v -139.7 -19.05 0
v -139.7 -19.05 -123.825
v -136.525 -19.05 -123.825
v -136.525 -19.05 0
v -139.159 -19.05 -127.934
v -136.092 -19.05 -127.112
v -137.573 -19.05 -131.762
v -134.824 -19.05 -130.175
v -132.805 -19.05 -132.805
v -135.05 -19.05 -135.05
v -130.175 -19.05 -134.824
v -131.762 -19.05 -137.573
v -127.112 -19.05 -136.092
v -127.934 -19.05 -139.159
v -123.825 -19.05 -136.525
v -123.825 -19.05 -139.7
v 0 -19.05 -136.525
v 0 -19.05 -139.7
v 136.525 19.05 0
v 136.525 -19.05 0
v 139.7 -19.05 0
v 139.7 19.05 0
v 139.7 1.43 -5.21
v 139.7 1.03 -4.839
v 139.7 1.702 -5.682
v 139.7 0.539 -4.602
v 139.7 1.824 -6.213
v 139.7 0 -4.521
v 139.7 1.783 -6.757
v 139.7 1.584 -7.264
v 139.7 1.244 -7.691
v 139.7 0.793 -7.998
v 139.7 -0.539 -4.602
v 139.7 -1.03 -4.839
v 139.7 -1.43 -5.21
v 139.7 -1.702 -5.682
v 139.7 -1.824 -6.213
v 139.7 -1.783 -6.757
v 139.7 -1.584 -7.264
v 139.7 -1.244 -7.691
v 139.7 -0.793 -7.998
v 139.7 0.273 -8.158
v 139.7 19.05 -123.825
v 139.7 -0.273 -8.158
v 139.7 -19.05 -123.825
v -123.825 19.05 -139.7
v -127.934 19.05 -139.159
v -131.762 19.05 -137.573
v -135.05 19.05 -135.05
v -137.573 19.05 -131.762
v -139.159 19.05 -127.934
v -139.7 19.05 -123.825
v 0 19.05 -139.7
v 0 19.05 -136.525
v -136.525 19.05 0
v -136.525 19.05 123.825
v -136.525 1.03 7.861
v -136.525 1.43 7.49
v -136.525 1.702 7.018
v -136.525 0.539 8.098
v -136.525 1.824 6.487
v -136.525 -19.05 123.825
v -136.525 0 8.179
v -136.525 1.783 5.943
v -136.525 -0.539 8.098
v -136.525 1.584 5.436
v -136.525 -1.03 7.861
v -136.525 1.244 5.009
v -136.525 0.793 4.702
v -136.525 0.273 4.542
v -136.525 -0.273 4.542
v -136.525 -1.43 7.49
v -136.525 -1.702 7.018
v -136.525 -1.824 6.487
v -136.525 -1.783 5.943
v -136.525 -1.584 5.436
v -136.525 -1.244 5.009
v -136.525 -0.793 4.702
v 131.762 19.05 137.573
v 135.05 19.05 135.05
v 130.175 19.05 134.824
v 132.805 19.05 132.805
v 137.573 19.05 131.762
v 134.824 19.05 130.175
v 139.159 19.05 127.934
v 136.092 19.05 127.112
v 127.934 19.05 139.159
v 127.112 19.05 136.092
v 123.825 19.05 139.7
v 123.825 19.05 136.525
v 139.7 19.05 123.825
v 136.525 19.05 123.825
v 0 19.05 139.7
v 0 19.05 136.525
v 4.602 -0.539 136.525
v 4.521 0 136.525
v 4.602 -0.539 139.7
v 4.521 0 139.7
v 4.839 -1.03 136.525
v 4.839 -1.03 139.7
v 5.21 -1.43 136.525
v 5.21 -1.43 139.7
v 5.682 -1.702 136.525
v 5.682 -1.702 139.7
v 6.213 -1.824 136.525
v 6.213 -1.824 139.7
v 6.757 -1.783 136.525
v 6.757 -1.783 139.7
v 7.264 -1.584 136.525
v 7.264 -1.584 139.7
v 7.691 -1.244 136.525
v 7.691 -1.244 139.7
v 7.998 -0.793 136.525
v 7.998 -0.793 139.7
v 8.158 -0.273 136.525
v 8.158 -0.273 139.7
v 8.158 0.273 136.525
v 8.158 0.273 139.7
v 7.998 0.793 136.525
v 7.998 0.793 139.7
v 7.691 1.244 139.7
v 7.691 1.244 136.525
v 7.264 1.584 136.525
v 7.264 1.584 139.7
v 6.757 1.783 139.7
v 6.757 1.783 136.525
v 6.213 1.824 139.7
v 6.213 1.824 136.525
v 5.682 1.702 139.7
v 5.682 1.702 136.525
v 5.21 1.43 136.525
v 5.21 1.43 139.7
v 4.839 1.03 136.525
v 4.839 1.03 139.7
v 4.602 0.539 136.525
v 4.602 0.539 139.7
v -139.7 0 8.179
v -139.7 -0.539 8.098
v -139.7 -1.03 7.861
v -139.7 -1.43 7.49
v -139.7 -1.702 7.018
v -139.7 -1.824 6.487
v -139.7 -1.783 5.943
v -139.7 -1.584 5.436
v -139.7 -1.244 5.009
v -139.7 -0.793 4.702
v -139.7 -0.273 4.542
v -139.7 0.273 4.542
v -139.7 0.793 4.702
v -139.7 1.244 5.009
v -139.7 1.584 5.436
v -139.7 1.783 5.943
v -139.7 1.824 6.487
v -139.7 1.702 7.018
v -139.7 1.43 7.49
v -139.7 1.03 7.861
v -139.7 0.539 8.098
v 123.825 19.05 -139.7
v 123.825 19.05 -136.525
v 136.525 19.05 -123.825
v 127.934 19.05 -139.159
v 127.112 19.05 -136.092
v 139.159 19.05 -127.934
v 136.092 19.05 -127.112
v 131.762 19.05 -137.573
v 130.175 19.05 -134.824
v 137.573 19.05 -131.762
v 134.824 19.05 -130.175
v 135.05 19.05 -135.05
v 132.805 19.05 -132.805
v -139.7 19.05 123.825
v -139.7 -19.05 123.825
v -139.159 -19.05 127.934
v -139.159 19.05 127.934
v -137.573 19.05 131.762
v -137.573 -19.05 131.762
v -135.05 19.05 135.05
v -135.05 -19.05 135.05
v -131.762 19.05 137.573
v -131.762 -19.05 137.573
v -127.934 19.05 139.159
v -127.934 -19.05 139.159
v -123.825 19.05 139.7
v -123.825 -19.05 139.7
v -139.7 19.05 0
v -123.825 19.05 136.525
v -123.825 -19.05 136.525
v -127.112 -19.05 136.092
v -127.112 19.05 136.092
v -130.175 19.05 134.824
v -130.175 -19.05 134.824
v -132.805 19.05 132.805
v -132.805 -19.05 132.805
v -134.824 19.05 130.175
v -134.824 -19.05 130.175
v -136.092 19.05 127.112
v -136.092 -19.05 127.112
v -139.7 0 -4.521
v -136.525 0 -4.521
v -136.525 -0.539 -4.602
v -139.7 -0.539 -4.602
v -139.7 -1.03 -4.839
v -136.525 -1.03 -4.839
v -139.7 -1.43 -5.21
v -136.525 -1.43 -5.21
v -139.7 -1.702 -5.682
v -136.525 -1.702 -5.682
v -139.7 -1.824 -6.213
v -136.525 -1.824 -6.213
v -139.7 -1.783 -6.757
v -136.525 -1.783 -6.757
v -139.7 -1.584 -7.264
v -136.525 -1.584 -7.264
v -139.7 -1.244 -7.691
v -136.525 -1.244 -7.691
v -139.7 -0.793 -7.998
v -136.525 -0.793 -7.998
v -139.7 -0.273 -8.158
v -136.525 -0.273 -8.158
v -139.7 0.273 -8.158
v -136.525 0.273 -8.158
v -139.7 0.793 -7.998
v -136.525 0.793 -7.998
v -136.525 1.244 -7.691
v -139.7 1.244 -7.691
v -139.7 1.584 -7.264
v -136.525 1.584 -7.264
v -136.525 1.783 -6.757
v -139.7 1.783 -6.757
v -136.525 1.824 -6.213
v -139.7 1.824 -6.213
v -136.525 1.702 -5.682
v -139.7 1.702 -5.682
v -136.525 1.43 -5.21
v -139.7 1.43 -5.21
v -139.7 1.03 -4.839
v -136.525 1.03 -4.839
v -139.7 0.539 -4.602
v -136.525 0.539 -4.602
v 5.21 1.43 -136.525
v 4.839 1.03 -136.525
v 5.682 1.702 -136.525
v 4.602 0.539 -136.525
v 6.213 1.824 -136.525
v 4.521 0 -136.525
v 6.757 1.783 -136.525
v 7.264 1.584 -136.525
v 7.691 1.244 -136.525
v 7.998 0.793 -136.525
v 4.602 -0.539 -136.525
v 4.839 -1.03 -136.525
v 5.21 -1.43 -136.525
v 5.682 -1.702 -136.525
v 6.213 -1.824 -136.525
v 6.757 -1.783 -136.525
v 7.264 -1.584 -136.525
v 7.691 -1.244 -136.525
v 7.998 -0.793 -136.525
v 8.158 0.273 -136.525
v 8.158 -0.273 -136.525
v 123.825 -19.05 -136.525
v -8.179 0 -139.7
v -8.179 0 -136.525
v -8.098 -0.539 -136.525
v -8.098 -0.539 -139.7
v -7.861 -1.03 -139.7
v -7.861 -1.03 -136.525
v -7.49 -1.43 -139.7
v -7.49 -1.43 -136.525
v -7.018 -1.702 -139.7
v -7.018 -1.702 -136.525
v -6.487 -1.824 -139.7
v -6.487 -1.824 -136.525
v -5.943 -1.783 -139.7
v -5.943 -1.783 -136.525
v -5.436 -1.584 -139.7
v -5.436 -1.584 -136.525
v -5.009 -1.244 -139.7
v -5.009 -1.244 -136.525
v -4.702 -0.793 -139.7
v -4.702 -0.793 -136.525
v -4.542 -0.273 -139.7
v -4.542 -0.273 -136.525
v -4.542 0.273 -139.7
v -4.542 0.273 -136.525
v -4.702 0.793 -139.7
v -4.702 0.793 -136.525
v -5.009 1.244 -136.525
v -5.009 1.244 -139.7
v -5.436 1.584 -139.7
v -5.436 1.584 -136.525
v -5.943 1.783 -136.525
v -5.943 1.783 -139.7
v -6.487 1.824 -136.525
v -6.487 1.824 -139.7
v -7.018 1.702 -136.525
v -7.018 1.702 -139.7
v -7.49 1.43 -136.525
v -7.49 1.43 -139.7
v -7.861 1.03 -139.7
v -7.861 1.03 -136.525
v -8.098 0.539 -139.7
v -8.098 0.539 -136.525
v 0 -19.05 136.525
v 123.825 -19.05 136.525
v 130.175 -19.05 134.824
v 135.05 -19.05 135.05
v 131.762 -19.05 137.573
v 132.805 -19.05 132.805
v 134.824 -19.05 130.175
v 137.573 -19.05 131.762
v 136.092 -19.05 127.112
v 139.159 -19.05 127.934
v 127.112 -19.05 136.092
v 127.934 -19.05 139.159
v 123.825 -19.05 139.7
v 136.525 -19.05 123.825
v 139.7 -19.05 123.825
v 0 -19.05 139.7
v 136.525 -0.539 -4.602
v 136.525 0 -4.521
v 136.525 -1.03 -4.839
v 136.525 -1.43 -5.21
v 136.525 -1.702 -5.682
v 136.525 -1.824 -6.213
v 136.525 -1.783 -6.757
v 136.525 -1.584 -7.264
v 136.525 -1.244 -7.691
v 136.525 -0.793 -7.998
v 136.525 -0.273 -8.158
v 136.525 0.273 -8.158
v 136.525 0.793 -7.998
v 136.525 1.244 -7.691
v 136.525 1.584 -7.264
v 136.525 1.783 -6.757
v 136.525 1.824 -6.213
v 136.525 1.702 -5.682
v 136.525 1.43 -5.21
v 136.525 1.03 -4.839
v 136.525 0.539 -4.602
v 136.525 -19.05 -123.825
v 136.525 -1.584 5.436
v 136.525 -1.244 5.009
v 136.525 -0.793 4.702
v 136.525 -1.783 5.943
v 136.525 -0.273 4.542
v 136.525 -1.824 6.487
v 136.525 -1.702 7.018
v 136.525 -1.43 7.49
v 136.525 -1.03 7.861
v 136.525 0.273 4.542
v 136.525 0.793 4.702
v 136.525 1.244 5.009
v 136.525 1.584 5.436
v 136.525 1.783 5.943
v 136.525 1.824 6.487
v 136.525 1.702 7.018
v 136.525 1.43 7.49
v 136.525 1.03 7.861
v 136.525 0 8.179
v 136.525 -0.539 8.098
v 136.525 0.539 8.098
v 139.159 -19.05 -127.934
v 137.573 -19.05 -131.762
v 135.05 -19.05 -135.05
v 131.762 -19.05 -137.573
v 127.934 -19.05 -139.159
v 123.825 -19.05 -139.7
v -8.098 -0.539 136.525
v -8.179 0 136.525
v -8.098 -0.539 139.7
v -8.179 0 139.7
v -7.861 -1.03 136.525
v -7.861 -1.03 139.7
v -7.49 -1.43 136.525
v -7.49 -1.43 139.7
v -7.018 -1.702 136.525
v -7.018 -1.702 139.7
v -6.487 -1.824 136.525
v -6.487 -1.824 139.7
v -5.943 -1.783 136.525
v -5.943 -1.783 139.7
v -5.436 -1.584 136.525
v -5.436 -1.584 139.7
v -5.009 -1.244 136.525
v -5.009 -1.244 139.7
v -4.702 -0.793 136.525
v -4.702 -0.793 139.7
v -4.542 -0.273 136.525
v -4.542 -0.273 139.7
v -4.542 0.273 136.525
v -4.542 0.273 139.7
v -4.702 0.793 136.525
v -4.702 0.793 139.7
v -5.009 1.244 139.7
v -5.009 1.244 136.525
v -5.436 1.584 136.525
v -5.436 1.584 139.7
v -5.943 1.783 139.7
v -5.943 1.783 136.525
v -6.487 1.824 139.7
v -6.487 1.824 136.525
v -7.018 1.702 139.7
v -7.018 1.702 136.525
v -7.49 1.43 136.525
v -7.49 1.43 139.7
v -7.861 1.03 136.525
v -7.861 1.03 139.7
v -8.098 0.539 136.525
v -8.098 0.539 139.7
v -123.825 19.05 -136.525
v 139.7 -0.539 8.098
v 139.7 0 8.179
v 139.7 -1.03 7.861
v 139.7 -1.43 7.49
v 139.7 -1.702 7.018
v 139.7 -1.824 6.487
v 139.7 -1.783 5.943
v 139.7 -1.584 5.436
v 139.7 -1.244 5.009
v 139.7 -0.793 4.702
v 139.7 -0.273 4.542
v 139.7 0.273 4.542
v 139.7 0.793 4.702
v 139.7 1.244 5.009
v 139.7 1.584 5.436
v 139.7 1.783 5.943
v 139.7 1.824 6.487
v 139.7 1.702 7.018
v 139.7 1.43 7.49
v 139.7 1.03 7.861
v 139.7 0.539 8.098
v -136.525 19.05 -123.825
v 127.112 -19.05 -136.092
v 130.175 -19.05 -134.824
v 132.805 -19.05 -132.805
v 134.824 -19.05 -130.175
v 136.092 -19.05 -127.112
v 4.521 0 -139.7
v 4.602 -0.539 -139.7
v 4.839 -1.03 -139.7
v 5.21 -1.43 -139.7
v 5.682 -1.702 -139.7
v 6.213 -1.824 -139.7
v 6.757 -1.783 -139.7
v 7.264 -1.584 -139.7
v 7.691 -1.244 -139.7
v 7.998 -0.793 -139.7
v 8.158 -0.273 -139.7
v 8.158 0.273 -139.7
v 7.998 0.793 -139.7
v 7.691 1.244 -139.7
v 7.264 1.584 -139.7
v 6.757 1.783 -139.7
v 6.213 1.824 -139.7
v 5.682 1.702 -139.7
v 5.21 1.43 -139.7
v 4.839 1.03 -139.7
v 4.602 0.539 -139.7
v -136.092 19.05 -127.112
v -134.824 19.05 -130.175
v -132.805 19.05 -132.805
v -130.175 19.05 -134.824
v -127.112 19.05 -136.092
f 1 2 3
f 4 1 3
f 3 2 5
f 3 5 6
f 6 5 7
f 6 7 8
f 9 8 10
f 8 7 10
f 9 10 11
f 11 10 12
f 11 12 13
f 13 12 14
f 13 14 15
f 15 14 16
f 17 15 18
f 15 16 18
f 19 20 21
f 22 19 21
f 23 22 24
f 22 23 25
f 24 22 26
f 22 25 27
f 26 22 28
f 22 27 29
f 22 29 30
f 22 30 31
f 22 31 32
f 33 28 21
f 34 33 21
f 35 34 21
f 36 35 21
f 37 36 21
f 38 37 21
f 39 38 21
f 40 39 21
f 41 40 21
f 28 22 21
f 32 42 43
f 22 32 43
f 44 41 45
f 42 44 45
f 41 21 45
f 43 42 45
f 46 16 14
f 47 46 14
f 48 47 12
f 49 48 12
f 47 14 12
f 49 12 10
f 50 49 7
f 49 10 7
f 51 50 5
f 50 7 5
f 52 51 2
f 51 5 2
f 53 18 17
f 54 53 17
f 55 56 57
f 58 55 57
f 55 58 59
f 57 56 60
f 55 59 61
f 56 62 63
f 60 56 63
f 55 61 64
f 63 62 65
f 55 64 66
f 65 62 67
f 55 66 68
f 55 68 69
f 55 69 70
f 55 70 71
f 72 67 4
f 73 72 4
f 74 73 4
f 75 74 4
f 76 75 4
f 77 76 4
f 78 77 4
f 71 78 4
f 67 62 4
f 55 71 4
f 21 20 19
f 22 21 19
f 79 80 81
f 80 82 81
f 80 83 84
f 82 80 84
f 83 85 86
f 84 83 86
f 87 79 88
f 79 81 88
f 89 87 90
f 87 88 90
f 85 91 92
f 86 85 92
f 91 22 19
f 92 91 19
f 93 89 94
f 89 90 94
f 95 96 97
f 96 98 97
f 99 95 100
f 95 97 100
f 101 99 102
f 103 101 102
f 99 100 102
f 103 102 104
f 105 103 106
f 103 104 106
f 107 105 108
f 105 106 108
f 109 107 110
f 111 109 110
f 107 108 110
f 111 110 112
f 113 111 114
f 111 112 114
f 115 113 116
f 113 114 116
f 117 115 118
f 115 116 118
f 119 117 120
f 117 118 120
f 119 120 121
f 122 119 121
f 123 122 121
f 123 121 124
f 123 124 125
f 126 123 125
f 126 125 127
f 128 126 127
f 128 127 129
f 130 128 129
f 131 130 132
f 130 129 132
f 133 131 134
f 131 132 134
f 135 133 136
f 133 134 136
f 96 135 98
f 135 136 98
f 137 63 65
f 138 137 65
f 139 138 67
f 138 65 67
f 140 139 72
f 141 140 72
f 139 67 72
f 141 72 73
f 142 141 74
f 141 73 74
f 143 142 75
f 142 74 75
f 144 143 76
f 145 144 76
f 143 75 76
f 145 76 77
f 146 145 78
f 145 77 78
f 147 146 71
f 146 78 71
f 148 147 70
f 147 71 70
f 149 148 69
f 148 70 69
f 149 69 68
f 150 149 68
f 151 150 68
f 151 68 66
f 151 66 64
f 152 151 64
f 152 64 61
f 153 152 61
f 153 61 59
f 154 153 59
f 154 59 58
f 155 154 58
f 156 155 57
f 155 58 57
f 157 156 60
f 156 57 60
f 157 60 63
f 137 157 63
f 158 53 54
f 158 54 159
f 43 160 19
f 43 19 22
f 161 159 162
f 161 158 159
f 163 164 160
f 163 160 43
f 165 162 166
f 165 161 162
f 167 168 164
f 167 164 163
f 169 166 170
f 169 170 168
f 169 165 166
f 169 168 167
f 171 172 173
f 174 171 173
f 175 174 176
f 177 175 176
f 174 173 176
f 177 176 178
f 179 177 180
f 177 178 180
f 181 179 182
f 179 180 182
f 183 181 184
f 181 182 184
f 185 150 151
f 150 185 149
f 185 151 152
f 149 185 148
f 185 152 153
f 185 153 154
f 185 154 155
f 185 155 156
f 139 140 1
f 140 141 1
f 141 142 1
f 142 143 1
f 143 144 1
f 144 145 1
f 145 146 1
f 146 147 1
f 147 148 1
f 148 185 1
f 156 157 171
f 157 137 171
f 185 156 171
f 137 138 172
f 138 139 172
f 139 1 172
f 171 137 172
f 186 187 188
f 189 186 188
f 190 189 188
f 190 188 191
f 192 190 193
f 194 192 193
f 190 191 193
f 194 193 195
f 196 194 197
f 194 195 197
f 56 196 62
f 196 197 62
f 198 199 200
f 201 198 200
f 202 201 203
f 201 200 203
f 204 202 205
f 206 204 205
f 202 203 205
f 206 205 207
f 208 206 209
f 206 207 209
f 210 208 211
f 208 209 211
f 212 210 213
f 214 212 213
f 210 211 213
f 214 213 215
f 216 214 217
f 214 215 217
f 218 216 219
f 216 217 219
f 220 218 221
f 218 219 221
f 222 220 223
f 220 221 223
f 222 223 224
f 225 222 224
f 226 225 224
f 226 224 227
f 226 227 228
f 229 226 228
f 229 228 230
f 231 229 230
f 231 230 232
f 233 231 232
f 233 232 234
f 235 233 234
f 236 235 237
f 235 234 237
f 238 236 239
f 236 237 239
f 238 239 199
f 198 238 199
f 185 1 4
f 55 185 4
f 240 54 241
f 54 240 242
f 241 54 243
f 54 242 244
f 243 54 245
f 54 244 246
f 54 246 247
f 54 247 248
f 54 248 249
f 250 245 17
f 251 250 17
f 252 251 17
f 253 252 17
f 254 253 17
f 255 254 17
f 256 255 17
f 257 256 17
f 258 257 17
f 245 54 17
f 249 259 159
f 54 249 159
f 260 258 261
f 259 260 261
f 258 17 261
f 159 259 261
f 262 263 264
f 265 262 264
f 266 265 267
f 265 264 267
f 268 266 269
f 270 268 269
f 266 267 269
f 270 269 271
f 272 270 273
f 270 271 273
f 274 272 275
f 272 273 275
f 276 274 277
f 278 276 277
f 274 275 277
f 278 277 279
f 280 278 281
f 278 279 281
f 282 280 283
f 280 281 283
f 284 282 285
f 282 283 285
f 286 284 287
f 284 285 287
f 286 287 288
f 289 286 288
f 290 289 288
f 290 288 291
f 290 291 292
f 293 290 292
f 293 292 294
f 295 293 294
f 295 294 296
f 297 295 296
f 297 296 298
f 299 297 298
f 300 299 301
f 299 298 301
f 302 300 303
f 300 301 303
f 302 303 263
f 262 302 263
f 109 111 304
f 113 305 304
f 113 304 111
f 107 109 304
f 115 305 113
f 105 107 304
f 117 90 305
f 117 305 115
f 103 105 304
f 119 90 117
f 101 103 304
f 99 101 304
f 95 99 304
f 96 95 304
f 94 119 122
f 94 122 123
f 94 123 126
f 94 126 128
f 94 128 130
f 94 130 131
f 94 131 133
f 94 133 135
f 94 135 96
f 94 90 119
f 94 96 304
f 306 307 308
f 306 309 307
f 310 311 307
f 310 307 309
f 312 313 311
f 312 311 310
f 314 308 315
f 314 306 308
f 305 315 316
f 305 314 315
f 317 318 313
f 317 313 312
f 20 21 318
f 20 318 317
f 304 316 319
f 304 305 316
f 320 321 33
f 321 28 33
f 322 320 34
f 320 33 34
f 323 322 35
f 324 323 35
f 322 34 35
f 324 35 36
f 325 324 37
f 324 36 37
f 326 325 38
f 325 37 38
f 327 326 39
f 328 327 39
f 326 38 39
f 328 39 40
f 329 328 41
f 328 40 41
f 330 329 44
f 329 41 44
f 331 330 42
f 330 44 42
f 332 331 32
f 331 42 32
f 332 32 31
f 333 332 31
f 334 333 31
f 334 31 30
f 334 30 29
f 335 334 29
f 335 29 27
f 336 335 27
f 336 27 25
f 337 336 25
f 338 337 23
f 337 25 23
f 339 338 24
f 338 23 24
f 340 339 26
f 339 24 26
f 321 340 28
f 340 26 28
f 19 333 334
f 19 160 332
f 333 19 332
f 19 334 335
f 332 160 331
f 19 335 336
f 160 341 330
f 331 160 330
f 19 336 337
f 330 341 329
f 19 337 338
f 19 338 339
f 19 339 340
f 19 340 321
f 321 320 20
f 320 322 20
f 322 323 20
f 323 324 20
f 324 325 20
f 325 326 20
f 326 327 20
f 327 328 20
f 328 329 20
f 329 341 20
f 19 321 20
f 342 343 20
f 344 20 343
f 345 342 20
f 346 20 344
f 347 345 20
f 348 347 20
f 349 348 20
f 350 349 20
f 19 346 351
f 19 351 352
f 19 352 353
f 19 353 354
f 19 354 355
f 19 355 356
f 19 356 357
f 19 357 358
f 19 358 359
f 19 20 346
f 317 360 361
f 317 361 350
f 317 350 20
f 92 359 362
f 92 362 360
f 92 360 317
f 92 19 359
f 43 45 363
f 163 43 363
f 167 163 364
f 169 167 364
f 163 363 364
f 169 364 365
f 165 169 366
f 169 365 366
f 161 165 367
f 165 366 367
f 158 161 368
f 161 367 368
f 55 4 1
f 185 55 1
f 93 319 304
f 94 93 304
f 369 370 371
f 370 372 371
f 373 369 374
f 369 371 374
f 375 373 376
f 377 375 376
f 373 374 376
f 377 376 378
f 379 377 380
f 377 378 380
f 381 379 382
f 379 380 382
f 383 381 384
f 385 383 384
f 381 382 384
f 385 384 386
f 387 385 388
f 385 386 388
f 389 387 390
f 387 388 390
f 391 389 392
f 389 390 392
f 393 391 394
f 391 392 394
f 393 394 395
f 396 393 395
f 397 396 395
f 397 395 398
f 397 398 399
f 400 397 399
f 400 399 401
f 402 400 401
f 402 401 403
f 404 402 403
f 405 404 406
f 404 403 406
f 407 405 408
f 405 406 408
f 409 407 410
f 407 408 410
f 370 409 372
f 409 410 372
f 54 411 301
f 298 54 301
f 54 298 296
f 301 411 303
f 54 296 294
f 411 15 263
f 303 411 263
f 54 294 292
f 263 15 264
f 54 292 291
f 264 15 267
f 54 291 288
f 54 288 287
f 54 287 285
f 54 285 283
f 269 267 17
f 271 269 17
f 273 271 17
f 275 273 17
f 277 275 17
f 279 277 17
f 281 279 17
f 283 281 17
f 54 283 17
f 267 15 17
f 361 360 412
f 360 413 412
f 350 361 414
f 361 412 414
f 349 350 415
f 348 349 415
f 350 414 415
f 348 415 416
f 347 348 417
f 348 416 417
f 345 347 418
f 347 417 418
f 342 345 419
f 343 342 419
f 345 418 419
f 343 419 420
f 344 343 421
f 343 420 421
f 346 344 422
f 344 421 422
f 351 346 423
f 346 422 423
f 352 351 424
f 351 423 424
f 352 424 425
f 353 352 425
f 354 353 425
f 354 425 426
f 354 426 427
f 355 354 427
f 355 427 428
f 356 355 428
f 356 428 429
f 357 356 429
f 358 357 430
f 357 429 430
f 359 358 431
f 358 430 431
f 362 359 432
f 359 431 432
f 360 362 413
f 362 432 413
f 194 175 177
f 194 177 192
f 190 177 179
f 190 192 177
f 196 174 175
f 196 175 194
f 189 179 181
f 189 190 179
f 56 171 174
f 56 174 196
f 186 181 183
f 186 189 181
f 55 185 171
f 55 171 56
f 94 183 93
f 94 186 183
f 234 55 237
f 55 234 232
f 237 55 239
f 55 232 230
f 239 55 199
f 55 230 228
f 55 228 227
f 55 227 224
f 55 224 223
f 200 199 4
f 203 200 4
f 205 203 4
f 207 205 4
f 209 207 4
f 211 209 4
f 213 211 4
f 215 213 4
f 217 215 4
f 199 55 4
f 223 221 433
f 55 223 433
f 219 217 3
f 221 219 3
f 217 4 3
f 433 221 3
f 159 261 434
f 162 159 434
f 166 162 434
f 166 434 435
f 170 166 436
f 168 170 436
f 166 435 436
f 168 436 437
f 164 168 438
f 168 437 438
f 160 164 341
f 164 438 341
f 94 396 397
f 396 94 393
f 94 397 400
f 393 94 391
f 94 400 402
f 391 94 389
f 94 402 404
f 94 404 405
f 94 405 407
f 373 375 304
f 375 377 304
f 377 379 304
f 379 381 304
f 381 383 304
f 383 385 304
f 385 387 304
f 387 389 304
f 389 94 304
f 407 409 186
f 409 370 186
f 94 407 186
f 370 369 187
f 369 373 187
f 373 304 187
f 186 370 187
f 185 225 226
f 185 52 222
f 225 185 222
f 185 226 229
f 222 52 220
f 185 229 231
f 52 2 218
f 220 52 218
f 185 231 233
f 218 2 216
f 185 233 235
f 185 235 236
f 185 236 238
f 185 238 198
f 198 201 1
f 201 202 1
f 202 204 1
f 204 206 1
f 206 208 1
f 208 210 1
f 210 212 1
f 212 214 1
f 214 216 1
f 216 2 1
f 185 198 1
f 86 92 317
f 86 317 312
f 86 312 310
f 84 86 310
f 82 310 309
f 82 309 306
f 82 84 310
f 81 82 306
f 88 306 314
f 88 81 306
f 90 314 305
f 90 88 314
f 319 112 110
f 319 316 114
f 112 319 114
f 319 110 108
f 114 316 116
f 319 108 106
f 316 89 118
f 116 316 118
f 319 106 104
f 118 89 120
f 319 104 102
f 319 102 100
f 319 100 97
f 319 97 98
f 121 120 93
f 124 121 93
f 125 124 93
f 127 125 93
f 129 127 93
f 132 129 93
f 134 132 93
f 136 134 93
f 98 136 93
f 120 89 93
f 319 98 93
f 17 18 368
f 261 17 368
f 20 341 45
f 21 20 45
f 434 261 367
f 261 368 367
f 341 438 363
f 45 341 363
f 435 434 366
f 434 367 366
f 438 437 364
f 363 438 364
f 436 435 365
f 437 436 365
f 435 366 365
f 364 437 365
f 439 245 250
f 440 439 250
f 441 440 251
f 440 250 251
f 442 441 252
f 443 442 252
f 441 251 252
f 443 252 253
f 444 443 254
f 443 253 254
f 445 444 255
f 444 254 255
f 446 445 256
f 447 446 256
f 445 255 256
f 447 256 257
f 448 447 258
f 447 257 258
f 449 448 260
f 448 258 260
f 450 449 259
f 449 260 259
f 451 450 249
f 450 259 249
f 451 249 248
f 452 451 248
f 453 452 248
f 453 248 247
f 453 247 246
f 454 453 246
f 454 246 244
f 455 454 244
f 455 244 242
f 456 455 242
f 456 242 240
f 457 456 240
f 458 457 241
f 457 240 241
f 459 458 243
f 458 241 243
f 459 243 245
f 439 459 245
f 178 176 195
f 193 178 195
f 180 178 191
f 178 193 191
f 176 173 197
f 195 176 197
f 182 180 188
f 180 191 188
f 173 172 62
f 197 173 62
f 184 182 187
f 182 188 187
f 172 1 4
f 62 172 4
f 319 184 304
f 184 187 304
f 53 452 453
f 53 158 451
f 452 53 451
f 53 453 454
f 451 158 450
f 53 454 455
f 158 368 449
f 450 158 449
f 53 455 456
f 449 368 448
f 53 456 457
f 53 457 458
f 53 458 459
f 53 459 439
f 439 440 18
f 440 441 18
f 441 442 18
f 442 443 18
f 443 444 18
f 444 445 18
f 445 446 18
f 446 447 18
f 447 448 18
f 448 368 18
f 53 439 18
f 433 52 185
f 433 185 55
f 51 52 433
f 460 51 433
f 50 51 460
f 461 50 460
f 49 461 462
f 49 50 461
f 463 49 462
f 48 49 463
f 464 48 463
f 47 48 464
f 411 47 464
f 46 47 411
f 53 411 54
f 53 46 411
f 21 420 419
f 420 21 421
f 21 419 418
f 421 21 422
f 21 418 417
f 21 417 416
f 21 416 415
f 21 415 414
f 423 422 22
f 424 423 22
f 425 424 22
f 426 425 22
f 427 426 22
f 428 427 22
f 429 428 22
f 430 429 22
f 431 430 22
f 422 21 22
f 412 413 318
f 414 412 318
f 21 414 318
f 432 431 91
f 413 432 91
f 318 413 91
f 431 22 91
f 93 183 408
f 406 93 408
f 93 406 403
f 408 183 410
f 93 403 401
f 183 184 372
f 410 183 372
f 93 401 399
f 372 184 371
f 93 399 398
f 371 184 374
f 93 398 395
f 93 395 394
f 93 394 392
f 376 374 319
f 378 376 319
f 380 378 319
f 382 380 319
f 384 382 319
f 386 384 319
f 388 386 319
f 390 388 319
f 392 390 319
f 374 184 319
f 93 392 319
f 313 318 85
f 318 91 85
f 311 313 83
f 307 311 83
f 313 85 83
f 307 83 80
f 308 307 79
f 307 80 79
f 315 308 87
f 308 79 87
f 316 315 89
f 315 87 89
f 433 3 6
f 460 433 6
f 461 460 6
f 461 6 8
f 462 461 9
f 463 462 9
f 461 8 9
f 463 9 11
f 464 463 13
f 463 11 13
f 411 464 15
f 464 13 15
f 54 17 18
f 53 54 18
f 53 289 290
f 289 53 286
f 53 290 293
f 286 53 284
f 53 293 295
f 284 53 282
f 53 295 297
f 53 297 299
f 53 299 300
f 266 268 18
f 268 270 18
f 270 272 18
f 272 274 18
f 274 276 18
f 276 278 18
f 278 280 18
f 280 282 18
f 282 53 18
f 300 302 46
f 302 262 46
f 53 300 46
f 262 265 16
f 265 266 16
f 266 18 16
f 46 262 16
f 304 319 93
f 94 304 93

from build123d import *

# Parameters (mm, degrees)
BOSS_EXTRUDE1_DEPTH            = 19.05
SPLIT1_START                   = -19.05
SPLIT1_DEPTH                   = 38.1
SPLIT1_START_2                 = -139.7
SPLIT1_2_OUTLINE_W             = 38.1
SPLIT1_2_OUTLINE_H             = 279.4
SPLIT1_2_DEPTH                 = 139.7
SPLIT1_3_OUTLINE_W             = 38.1
SPLIT1_3_OUTLINE_H             = 139.7
SPLIT1_3_DEPTH                 = 139.7
SPLIT1_4_DEPTH                 = 38.1
SPLIT1_5_DEPTH                 = 38.1
SKETCH6_W                      = 1.8288
SKETCH6_H                      = 279.4
F_6_CLEARANCE_HOLE1_AT_2_COUNT = 2
F_6_CLEARANCE_HOLE1_AT_2_PITCH = 12.7
CIRPATTERN1_COUNT              = 2
CIRPATTERN1_ANGLE              = 90
CIRPATTERN1_COPY_1_SKETCH_W    = 1.8288
CIRPATTERN1_COPY_1_SKETCH_H    = 279.4


# Read off the part's stored shape, not the designer's step: Split1
with BuildPart() as part:
    # Sketch1 → Boss-Extrude1 (new, symmetric)
    with BuildSketch(Plane(origin=(0, 0, 0), x_dir=(1, 0, 0), z_dir=(0, 1, 0))):
        with BuildLine():
            Line((-123.825, 139.7), (123.825, 139.7))
            ThreePointArc((123.825, 139.7), (135.050320151, 135.050320151), (139.7, 123.825))
            Line((139.7, 123.825), (139.7, -123.825))
            ThreePointArc((139.7, -123.825), (135.050320151, -135.050320151), (123.825, -139.7))
            Line((123.825, -139.7), (-123.825, -139.7))
            ThreePointArc((-123.825, -139.7), (-135.050320151, -135.050320151), (-139.7, -123.825))
            Line((-139.7, -123.825), (-139.7, 123.825))
            ThreePointArc((-139.7, 123.825), (-135.050320151, 135.050320151), (-123.825, 139.7))
        make_face()
        with BuildLine():
            Line((-123.825, 136.525), (123.825, 136.525))
            ThreePointArc((123.825, 136.525), (132.805256121, 132.805256121), (136.525, 123.825))
            Line((136.525, 123.825), (136.525, -123.825))
            ThreePointArc((136.525, -123.825), (132.805256121, -132.805256121), (123.825, -136.525))
            Line((123.825, -136.525), (-123.825, -136.525))
            ThreePointArc((-123.825, -136.525), (-132.805256121, -132.805256121), (-136.525, -123.825))
            Line((-136.525, -123.825), (-136.525, 123.825))
            ThreePointArc((-136.525, 123.825), (-132.805256121, 132.805256121), (-123.825, 136.525))
        make_face(mode=Mode.SUBTRACT)
    extrude(amount=BOSS_EXTRUDE1_DEPTH, both=True)

    # Split1 2 outline → Split1 2 (cut)
    with BuildSketch(Plane.YZ.offset(SPLIT1_START_2)):
        Rectangle(SPLIT1_2_OUTLINE_W, SPLIT1_2_OUTLINE_H)
    extrude(amount=SPLIT1_2_DEPTH, mode=Mode.SUBTRACT)

    # Split1 3 outline → Split1 3 (cut)
    with BuildSketch(Plane.YZ):
        with Locations((0, -69.85)):
            Rectangle(SPLIT1_3_OUTLINE_W, SPLIT1_3_OUTLINE_H)
    extrude(amount=SPLIT1_3_DEPTH, mode=Mode.SUBTRACT)


with BuildPart() as body_2:
    # Split1 outline → Split1 (new body)
    with BuildSketch(Plane(origin=(0, 0, 0), x_dir=(1, 0, 0), z_dir=(0, 1, 0)).offset(SPLIT1_START)):
        with BuildLine():
            Line((-123.825, 136.525), (0, 136.525))
            Line((0, 136.525), (0, 139.7))
            Line((0, 139.7), (-123.825, 139.7))
            ThreePointArc((-123.825, 139.7), (-135.050320151, 135.050320151), (-139.7, 123.825))
            Line((-139.7, 123.825), (-139.7, 0))
            Line((-139.7, 0), (-136.525, 0))
            Line((-136.525, 0), (-136.525, 123.825))
            ThreePointArc((-136.525, 123.825), (-132.805256121, 132.805256121), (-123.825, 136.525))
        make_face()
    extrude(amount=SPLIT1_DEPTH)


with BuildPart() as body_3:
    # Split1 4 outline → Split1 4 (new body)
    with BuildSketch(Plane(origin=(0, 0, 0), x_dir=(1, 0, 0), z_dir=(0, 1, 0)).offset(SPLIT1_START)):
        with BuildLine():
            Line((-136.525, 0), (-139.7, 0))
            Line((-139.7, 0), (-139.7, -123.825))
            ThreePointArc((-139.7, -123.825), (-135.050320151, -135.050320151), (-123.825, -139.7))
            Line((-123.825, -139.7), (0, -139.7))
            Line((0, -139.7), (0, -136.525))
            Line((0, -136.525), (-123.825, -136.525))
            ThreePointArc((-123.825, -136.525), (-132.805256121, -132.805256121), (-136.525, -123.825))
            Line((-136.525, -123.825), (-136.525, 0))
        make_face()
    extrude(amount=SPLIT1_4_DEPTH)


with BuildPart() as body_4:
    # Split1 5 outline → Split1 5 (new body)
    with BuildSketch(Plane(origin=(0, 0, 0), x_dir=(1, 0, 0), z_dir=(0, 1, 0)).offset(SPLIT1_START)):
        with BuildLine():
            Line((0, 139.7), (0, 136.525))
            Line((0, 136.525), (123.825, 136.525))
            ThreePointArc((123.825, 136.525), (132.805256121, 132.805256121), (136.525, 123.825))
            Line((136.525, 123.825), (136.525, 0))
            Line((136.525, 0), (139.7, 0))
            Line((139.7, 0), (139.7, 123.825))
            ThreePointArc((139.7, 123.825), (135.050320151, 135.050320151), (123.825, 139.7))
            Line((123.825, 139.7), (0, 139.7))
        make_face()
    extrude(amount=SPLIT1_5_DEPTH)


with BuildPart() as f_6_clearance_hole1_tool:
    # Sketch6 → #6 Clearance Hole1 (revolve)
    with BuildSketch(Plane(origin=(-139.7, 0, 6.35), x_dir=(0, 0, 1), z_dir=(0, 1, 0))):
        with Locations((0.9144, 139.7)):
            Rectangle(SKETCH6_W, SKETCH6_H)
    f_6_clearance_hole1 = revolve(axis=Axis((-146.05, 0, 6.35), (1, 0, 0)))


with BuildPart() as part_1:
    add(part.part)

    # #6 Clearance Hole1: cut by f_6_clearance_hole1_tool
    add(f_6_clearance_hole1_tool.part, mode=Mode.SUBTRACT)


with BuildPart() as body_3_1:
    add(body_3.part)

    # #6 Clearance Hole1: cut by f_6_clearance_hole1_tool
    add(f_6_clearance_hole1_tool.part, mode=Mode.SUBTRACT)


with BuildPart() as f_6_clearance_hole1_at_2_tool:
    # #6 Clearance Hole1 at 2: #6 Clearance Hole1 ×2
    with Locations(*[(0, 0, -i * F_6_CLEARANCE_HOLE1_AT_2_PITCH) for i in range(1, F_6_CLEARANCE_HOLE1_AT_2_COUNT)]):
        add(f_6_clearance_hole1)


with BuildPart() as body_2_1:
    add(body_2.part)

    # #6 Clearance Hole1 at 2: cut by f_6_clearance_hole1_at_2_tool
    add(f_6_clearance_hole1_at_2_tool.part, mode=Mode.SUBTRACT)


with BuildPart() as body_4_1:
    add(body_4.part)

    # #6 Clearance Hole1 at 2: cut by f_6_clearance_hole1_at_2_tool
    add(f_6_clearance_hole1_at_2_tool.part, mode=Mode.SUBTRACT)


with BuildPart() as cirpattern1_tool:
    # CirPattern1: #6 Clearance Hole1 ×2 about axis
    cirpattern1_axis = Axis((0, 20.955, 0), (0, -1, 0))
    for i in range(1, CIRPATTERN1_COUNT):
        add(f_6_clearance_hole1.rotate(cirpattern1_axis, i * CIRPATTERN1_ANGLE / (CIRPATTERN1_COUNT - 1)))


with BuildPart() as body_2_2:
    add(body_2_1.part)

    # CirPattern1: cut by cirpattern1_tool
    add(cirpattern1_tool.part, mode=Mode.SUBTRACT)


with BuildPart() as body_3_2:
    add(body_3_1.part)

    # CirPattern1: cut by cirpattern1_tool
    add(cirpattern1_tool.part, mode=Mode.SUBTRACT)


with BuildPart() as cirpattern1_copy_1_tool:
    # CirPattern1 copy 1 sketch → CirPattern1 copy 1 (revolve)
    with BuildSketch(Plane(origin=(6.35, 0, -139.7), x_dir=(-1, 0, 0), z_dir=(0, 1, 0))):
        with Locations((0.9144, 139.7)):
            Rectangle(CIRPATTERN1_COPY_1_SKETCH_W, CIRPATTERN1_COPY_1_SKETCH_H)
    revolve(axis=Axis((6.35, 0, -146.05), (0, 0, 1)))


with BuildPart() as part_2:
    add(part_1.part)

    # CirPattern1 copy 1: cut by cirpattern1_copy_1_tool
    add(cirpattern1_copy_1_tool.part, mode=Mode.SUBTRACT)


with BuildPart() as body_4_2:
    add(body_4_1.part)

    # CirPattern1 copy 1: cut by cirpattern1_copy_1_tool
    add(cirpattern1_copy_1_tool.part, mode=Mode.SUBTRACT)


solid = Compound([body_2_2.part, body_3_2.part, part_2.part, body_4_2.part])
